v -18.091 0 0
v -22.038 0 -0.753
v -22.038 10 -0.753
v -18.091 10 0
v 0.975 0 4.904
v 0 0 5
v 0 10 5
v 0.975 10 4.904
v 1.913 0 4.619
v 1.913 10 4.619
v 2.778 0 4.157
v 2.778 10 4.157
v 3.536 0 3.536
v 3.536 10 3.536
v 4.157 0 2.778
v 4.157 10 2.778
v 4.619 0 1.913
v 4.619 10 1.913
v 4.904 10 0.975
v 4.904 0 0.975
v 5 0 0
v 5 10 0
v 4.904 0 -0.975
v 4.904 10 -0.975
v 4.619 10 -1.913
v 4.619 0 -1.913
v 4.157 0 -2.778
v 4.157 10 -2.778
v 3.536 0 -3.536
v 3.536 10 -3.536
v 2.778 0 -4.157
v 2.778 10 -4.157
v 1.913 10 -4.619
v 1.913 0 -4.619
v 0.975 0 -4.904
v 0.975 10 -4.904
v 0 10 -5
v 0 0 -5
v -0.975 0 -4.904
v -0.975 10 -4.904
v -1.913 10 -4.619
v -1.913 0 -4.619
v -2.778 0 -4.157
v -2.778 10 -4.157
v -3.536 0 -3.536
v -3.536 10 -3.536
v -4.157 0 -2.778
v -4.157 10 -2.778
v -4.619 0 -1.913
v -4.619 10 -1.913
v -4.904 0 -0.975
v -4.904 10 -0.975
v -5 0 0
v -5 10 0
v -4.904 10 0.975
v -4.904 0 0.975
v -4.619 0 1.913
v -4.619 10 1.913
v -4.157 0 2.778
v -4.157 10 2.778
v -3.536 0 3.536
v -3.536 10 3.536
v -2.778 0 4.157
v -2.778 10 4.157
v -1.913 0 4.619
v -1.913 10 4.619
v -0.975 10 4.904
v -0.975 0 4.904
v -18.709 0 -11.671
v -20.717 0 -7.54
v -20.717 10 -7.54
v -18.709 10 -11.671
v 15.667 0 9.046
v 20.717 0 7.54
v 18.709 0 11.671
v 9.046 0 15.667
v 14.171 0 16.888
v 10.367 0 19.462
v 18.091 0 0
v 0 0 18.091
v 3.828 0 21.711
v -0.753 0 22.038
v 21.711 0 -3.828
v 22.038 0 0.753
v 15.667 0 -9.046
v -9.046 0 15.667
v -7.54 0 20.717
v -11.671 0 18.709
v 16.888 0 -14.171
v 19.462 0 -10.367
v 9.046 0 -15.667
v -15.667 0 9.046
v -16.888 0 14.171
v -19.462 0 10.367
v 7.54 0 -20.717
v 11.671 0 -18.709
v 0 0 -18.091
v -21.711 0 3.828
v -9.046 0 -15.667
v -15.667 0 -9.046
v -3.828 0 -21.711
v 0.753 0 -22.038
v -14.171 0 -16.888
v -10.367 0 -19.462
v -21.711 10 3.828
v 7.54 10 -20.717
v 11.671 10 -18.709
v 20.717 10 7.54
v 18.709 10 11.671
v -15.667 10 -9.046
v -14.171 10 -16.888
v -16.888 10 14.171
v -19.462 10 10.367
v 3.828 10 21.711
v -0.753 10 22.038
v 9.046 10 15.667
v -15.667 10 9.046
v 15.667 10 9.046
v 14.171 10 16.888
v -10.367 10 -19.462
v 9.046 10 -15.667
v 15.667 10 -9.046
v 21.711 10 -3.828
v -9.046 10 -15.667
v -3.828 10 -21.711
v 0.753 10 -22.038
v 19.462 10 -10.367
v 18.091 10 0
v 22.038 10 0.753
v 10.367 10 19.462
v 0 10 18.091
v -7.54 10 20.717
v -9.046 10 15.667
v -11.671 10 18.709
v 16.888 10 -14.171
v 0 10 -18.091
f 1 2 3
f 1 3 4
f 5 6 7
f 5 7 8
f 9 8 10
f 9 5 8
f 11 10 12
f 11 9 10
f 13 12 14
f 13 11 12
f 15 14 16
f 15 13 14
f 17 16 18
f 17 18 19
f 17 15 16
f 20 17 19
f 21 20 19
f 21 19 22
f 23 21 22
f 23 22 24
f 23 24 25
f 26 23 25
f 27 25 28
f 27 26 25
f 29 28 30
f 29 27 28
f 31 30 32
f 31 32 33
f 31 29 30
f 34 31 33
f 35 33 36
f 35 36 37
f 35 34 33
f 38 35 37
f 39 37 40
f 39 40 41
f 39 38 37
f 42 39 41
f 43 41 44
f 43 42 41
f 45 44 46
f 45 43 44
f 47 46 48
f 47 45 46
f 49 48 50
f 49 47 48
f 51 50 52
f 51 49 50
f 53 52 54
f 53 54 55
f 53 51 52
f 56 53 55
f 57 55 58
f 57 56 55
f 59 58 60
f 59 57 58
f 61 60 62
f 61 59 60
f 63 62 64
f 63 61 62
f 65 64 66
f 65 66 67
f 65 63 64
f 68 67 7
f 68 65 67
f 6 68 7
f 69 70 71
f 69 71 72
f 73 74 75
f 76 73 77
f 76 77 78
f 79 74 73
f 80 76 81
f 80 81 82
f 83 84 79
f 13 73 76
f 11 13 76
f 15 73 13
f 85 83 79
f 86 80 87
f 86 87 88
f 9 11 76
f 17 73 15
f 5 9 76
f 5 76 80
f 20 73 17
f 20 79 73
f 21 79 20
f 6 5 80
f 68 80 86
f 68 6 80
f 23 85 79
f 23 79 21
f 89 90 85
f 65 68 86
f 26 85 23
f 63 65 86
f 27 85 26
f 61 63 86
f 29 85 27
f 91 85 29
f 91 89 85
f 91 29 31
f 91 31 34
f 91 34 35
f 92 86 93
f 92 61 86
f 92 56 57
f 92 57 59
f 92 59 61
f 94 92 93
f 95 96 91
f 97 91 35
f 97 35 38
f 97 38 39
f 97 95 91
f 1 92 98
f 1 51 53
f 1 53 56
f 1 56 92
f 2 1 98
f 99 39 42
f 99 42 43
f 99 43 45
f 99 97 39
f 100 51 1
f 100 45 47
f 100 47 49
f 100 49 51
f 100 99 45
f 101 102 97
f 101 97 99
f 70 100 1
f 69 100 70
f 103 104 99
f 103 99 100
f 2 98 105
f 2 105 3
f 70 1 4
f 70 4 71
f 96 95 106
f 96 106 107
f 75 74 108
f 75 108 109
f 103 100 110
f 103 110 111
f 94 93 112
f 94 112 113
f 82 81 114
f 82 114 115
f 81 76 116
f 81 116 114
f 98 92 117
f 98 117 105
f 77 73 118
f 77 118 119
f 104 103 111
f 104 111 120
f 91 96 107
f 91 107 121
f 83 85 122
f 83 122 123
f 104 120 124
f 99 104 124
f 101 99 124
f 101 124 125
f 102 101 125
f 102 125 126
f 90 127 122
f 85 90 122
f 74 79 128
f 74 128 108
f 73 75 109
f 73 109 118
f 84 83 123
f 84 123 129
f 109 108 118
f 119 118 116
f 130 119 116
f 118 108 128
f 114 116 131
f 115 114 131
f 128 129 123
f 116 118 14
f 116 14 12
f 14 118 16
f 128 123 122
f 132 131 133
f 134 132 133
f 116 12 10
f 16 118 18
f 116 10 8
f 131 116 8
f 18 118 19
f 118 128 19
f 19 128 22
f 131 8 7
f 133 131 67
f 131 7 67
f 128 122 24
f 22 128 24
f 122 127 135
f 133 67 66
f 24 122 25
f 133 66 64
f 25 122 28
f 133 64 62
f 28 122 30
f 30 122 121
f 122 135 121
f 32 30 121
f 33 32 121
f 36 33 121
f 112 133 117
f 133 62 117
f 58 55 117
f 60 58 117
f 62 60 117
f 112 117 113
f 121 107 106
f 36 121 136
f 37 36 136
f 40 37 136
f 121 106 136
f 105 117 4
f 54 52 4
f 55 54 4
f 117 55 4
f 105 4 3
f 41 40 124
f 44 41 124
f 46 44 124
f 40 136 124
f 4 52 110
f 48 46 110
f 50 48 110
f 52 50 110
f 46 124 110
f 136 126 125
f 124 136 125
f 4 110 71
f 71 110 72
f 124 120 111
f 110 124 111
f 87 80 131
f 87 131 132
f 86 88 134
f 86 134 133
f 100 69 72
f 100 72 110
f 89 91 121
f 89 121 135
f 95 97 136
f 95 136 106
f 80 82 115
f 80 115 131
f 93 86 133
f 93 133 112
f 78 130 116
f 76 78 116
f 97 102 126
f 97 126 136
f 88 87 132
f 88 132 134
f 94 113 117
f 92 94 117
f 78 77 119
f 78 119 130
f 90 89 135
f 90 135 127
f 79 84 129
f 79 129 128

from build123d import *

# Parameters (mm, degrees)
SKETCH_1_R      = 5
EXTRUDE_1_DEPTH = 10


with BuildPart() as part:
    # 草图1 → 凸台-拉伸1 (new body)
    with BuildSketch(Plane(origin=(0, 0, 0), x_dir=(1, 0, 0), z_dir=(0, 1, 0))):
        Polygon((0, 18.091268752), (7.540032115, 20.716584923), (11.670850027, 18.708548438), (9.045634376, 15.667498326), (16.888151818, 14.171072765), (19.461526826, 10.366653202), (15.667498326, 9.045634376), (21.71110488, 3.828433104), (22.037503228, -0.752978388), (18.091268752, 0), (20.716584923, -7.540032115), (18.708548438, -11.670850027), (15.667498326, -9.045634376), (14.171072765, -16.888151818), (10.366653202, -19.461526826), (9.045634376, -15.667498326), (3.828433104, -21.71110488), (-0.752978388, -22.037503228), (0, -18.091268752), (-7.540032115, -20.716584923), (-11.670850027, -18.708548438), (-9.045634376, -15.667498326), (-16.888151818, -14.171072765), (-19.461526826, -10.366653202), (-15.667498326, -9.045634376), (-21.71110488, -3.828433104), (-22.037503228, 0.752978388), (-18.091268752, 0), (-20.716584923, 7.540032115), (-18.708548438, 11.670850027), (-15.667498326, 9.045634376), (-14.171072765, 16.888151818), (-10.366653202, 19.461526826), (-9.045634376, 15.667498326), (-3.828433104, 21.71110488), (0.752978388, 22.037503228), align=None)
        with Locations(Location((0, 0, 0), (0, 0, 270))):
            Circle(SKETCH_1_R, mode=Mode.SUBTRACT)
    extrude(amount=EXTRUDE_1_DEPTH)


solid = part.part
